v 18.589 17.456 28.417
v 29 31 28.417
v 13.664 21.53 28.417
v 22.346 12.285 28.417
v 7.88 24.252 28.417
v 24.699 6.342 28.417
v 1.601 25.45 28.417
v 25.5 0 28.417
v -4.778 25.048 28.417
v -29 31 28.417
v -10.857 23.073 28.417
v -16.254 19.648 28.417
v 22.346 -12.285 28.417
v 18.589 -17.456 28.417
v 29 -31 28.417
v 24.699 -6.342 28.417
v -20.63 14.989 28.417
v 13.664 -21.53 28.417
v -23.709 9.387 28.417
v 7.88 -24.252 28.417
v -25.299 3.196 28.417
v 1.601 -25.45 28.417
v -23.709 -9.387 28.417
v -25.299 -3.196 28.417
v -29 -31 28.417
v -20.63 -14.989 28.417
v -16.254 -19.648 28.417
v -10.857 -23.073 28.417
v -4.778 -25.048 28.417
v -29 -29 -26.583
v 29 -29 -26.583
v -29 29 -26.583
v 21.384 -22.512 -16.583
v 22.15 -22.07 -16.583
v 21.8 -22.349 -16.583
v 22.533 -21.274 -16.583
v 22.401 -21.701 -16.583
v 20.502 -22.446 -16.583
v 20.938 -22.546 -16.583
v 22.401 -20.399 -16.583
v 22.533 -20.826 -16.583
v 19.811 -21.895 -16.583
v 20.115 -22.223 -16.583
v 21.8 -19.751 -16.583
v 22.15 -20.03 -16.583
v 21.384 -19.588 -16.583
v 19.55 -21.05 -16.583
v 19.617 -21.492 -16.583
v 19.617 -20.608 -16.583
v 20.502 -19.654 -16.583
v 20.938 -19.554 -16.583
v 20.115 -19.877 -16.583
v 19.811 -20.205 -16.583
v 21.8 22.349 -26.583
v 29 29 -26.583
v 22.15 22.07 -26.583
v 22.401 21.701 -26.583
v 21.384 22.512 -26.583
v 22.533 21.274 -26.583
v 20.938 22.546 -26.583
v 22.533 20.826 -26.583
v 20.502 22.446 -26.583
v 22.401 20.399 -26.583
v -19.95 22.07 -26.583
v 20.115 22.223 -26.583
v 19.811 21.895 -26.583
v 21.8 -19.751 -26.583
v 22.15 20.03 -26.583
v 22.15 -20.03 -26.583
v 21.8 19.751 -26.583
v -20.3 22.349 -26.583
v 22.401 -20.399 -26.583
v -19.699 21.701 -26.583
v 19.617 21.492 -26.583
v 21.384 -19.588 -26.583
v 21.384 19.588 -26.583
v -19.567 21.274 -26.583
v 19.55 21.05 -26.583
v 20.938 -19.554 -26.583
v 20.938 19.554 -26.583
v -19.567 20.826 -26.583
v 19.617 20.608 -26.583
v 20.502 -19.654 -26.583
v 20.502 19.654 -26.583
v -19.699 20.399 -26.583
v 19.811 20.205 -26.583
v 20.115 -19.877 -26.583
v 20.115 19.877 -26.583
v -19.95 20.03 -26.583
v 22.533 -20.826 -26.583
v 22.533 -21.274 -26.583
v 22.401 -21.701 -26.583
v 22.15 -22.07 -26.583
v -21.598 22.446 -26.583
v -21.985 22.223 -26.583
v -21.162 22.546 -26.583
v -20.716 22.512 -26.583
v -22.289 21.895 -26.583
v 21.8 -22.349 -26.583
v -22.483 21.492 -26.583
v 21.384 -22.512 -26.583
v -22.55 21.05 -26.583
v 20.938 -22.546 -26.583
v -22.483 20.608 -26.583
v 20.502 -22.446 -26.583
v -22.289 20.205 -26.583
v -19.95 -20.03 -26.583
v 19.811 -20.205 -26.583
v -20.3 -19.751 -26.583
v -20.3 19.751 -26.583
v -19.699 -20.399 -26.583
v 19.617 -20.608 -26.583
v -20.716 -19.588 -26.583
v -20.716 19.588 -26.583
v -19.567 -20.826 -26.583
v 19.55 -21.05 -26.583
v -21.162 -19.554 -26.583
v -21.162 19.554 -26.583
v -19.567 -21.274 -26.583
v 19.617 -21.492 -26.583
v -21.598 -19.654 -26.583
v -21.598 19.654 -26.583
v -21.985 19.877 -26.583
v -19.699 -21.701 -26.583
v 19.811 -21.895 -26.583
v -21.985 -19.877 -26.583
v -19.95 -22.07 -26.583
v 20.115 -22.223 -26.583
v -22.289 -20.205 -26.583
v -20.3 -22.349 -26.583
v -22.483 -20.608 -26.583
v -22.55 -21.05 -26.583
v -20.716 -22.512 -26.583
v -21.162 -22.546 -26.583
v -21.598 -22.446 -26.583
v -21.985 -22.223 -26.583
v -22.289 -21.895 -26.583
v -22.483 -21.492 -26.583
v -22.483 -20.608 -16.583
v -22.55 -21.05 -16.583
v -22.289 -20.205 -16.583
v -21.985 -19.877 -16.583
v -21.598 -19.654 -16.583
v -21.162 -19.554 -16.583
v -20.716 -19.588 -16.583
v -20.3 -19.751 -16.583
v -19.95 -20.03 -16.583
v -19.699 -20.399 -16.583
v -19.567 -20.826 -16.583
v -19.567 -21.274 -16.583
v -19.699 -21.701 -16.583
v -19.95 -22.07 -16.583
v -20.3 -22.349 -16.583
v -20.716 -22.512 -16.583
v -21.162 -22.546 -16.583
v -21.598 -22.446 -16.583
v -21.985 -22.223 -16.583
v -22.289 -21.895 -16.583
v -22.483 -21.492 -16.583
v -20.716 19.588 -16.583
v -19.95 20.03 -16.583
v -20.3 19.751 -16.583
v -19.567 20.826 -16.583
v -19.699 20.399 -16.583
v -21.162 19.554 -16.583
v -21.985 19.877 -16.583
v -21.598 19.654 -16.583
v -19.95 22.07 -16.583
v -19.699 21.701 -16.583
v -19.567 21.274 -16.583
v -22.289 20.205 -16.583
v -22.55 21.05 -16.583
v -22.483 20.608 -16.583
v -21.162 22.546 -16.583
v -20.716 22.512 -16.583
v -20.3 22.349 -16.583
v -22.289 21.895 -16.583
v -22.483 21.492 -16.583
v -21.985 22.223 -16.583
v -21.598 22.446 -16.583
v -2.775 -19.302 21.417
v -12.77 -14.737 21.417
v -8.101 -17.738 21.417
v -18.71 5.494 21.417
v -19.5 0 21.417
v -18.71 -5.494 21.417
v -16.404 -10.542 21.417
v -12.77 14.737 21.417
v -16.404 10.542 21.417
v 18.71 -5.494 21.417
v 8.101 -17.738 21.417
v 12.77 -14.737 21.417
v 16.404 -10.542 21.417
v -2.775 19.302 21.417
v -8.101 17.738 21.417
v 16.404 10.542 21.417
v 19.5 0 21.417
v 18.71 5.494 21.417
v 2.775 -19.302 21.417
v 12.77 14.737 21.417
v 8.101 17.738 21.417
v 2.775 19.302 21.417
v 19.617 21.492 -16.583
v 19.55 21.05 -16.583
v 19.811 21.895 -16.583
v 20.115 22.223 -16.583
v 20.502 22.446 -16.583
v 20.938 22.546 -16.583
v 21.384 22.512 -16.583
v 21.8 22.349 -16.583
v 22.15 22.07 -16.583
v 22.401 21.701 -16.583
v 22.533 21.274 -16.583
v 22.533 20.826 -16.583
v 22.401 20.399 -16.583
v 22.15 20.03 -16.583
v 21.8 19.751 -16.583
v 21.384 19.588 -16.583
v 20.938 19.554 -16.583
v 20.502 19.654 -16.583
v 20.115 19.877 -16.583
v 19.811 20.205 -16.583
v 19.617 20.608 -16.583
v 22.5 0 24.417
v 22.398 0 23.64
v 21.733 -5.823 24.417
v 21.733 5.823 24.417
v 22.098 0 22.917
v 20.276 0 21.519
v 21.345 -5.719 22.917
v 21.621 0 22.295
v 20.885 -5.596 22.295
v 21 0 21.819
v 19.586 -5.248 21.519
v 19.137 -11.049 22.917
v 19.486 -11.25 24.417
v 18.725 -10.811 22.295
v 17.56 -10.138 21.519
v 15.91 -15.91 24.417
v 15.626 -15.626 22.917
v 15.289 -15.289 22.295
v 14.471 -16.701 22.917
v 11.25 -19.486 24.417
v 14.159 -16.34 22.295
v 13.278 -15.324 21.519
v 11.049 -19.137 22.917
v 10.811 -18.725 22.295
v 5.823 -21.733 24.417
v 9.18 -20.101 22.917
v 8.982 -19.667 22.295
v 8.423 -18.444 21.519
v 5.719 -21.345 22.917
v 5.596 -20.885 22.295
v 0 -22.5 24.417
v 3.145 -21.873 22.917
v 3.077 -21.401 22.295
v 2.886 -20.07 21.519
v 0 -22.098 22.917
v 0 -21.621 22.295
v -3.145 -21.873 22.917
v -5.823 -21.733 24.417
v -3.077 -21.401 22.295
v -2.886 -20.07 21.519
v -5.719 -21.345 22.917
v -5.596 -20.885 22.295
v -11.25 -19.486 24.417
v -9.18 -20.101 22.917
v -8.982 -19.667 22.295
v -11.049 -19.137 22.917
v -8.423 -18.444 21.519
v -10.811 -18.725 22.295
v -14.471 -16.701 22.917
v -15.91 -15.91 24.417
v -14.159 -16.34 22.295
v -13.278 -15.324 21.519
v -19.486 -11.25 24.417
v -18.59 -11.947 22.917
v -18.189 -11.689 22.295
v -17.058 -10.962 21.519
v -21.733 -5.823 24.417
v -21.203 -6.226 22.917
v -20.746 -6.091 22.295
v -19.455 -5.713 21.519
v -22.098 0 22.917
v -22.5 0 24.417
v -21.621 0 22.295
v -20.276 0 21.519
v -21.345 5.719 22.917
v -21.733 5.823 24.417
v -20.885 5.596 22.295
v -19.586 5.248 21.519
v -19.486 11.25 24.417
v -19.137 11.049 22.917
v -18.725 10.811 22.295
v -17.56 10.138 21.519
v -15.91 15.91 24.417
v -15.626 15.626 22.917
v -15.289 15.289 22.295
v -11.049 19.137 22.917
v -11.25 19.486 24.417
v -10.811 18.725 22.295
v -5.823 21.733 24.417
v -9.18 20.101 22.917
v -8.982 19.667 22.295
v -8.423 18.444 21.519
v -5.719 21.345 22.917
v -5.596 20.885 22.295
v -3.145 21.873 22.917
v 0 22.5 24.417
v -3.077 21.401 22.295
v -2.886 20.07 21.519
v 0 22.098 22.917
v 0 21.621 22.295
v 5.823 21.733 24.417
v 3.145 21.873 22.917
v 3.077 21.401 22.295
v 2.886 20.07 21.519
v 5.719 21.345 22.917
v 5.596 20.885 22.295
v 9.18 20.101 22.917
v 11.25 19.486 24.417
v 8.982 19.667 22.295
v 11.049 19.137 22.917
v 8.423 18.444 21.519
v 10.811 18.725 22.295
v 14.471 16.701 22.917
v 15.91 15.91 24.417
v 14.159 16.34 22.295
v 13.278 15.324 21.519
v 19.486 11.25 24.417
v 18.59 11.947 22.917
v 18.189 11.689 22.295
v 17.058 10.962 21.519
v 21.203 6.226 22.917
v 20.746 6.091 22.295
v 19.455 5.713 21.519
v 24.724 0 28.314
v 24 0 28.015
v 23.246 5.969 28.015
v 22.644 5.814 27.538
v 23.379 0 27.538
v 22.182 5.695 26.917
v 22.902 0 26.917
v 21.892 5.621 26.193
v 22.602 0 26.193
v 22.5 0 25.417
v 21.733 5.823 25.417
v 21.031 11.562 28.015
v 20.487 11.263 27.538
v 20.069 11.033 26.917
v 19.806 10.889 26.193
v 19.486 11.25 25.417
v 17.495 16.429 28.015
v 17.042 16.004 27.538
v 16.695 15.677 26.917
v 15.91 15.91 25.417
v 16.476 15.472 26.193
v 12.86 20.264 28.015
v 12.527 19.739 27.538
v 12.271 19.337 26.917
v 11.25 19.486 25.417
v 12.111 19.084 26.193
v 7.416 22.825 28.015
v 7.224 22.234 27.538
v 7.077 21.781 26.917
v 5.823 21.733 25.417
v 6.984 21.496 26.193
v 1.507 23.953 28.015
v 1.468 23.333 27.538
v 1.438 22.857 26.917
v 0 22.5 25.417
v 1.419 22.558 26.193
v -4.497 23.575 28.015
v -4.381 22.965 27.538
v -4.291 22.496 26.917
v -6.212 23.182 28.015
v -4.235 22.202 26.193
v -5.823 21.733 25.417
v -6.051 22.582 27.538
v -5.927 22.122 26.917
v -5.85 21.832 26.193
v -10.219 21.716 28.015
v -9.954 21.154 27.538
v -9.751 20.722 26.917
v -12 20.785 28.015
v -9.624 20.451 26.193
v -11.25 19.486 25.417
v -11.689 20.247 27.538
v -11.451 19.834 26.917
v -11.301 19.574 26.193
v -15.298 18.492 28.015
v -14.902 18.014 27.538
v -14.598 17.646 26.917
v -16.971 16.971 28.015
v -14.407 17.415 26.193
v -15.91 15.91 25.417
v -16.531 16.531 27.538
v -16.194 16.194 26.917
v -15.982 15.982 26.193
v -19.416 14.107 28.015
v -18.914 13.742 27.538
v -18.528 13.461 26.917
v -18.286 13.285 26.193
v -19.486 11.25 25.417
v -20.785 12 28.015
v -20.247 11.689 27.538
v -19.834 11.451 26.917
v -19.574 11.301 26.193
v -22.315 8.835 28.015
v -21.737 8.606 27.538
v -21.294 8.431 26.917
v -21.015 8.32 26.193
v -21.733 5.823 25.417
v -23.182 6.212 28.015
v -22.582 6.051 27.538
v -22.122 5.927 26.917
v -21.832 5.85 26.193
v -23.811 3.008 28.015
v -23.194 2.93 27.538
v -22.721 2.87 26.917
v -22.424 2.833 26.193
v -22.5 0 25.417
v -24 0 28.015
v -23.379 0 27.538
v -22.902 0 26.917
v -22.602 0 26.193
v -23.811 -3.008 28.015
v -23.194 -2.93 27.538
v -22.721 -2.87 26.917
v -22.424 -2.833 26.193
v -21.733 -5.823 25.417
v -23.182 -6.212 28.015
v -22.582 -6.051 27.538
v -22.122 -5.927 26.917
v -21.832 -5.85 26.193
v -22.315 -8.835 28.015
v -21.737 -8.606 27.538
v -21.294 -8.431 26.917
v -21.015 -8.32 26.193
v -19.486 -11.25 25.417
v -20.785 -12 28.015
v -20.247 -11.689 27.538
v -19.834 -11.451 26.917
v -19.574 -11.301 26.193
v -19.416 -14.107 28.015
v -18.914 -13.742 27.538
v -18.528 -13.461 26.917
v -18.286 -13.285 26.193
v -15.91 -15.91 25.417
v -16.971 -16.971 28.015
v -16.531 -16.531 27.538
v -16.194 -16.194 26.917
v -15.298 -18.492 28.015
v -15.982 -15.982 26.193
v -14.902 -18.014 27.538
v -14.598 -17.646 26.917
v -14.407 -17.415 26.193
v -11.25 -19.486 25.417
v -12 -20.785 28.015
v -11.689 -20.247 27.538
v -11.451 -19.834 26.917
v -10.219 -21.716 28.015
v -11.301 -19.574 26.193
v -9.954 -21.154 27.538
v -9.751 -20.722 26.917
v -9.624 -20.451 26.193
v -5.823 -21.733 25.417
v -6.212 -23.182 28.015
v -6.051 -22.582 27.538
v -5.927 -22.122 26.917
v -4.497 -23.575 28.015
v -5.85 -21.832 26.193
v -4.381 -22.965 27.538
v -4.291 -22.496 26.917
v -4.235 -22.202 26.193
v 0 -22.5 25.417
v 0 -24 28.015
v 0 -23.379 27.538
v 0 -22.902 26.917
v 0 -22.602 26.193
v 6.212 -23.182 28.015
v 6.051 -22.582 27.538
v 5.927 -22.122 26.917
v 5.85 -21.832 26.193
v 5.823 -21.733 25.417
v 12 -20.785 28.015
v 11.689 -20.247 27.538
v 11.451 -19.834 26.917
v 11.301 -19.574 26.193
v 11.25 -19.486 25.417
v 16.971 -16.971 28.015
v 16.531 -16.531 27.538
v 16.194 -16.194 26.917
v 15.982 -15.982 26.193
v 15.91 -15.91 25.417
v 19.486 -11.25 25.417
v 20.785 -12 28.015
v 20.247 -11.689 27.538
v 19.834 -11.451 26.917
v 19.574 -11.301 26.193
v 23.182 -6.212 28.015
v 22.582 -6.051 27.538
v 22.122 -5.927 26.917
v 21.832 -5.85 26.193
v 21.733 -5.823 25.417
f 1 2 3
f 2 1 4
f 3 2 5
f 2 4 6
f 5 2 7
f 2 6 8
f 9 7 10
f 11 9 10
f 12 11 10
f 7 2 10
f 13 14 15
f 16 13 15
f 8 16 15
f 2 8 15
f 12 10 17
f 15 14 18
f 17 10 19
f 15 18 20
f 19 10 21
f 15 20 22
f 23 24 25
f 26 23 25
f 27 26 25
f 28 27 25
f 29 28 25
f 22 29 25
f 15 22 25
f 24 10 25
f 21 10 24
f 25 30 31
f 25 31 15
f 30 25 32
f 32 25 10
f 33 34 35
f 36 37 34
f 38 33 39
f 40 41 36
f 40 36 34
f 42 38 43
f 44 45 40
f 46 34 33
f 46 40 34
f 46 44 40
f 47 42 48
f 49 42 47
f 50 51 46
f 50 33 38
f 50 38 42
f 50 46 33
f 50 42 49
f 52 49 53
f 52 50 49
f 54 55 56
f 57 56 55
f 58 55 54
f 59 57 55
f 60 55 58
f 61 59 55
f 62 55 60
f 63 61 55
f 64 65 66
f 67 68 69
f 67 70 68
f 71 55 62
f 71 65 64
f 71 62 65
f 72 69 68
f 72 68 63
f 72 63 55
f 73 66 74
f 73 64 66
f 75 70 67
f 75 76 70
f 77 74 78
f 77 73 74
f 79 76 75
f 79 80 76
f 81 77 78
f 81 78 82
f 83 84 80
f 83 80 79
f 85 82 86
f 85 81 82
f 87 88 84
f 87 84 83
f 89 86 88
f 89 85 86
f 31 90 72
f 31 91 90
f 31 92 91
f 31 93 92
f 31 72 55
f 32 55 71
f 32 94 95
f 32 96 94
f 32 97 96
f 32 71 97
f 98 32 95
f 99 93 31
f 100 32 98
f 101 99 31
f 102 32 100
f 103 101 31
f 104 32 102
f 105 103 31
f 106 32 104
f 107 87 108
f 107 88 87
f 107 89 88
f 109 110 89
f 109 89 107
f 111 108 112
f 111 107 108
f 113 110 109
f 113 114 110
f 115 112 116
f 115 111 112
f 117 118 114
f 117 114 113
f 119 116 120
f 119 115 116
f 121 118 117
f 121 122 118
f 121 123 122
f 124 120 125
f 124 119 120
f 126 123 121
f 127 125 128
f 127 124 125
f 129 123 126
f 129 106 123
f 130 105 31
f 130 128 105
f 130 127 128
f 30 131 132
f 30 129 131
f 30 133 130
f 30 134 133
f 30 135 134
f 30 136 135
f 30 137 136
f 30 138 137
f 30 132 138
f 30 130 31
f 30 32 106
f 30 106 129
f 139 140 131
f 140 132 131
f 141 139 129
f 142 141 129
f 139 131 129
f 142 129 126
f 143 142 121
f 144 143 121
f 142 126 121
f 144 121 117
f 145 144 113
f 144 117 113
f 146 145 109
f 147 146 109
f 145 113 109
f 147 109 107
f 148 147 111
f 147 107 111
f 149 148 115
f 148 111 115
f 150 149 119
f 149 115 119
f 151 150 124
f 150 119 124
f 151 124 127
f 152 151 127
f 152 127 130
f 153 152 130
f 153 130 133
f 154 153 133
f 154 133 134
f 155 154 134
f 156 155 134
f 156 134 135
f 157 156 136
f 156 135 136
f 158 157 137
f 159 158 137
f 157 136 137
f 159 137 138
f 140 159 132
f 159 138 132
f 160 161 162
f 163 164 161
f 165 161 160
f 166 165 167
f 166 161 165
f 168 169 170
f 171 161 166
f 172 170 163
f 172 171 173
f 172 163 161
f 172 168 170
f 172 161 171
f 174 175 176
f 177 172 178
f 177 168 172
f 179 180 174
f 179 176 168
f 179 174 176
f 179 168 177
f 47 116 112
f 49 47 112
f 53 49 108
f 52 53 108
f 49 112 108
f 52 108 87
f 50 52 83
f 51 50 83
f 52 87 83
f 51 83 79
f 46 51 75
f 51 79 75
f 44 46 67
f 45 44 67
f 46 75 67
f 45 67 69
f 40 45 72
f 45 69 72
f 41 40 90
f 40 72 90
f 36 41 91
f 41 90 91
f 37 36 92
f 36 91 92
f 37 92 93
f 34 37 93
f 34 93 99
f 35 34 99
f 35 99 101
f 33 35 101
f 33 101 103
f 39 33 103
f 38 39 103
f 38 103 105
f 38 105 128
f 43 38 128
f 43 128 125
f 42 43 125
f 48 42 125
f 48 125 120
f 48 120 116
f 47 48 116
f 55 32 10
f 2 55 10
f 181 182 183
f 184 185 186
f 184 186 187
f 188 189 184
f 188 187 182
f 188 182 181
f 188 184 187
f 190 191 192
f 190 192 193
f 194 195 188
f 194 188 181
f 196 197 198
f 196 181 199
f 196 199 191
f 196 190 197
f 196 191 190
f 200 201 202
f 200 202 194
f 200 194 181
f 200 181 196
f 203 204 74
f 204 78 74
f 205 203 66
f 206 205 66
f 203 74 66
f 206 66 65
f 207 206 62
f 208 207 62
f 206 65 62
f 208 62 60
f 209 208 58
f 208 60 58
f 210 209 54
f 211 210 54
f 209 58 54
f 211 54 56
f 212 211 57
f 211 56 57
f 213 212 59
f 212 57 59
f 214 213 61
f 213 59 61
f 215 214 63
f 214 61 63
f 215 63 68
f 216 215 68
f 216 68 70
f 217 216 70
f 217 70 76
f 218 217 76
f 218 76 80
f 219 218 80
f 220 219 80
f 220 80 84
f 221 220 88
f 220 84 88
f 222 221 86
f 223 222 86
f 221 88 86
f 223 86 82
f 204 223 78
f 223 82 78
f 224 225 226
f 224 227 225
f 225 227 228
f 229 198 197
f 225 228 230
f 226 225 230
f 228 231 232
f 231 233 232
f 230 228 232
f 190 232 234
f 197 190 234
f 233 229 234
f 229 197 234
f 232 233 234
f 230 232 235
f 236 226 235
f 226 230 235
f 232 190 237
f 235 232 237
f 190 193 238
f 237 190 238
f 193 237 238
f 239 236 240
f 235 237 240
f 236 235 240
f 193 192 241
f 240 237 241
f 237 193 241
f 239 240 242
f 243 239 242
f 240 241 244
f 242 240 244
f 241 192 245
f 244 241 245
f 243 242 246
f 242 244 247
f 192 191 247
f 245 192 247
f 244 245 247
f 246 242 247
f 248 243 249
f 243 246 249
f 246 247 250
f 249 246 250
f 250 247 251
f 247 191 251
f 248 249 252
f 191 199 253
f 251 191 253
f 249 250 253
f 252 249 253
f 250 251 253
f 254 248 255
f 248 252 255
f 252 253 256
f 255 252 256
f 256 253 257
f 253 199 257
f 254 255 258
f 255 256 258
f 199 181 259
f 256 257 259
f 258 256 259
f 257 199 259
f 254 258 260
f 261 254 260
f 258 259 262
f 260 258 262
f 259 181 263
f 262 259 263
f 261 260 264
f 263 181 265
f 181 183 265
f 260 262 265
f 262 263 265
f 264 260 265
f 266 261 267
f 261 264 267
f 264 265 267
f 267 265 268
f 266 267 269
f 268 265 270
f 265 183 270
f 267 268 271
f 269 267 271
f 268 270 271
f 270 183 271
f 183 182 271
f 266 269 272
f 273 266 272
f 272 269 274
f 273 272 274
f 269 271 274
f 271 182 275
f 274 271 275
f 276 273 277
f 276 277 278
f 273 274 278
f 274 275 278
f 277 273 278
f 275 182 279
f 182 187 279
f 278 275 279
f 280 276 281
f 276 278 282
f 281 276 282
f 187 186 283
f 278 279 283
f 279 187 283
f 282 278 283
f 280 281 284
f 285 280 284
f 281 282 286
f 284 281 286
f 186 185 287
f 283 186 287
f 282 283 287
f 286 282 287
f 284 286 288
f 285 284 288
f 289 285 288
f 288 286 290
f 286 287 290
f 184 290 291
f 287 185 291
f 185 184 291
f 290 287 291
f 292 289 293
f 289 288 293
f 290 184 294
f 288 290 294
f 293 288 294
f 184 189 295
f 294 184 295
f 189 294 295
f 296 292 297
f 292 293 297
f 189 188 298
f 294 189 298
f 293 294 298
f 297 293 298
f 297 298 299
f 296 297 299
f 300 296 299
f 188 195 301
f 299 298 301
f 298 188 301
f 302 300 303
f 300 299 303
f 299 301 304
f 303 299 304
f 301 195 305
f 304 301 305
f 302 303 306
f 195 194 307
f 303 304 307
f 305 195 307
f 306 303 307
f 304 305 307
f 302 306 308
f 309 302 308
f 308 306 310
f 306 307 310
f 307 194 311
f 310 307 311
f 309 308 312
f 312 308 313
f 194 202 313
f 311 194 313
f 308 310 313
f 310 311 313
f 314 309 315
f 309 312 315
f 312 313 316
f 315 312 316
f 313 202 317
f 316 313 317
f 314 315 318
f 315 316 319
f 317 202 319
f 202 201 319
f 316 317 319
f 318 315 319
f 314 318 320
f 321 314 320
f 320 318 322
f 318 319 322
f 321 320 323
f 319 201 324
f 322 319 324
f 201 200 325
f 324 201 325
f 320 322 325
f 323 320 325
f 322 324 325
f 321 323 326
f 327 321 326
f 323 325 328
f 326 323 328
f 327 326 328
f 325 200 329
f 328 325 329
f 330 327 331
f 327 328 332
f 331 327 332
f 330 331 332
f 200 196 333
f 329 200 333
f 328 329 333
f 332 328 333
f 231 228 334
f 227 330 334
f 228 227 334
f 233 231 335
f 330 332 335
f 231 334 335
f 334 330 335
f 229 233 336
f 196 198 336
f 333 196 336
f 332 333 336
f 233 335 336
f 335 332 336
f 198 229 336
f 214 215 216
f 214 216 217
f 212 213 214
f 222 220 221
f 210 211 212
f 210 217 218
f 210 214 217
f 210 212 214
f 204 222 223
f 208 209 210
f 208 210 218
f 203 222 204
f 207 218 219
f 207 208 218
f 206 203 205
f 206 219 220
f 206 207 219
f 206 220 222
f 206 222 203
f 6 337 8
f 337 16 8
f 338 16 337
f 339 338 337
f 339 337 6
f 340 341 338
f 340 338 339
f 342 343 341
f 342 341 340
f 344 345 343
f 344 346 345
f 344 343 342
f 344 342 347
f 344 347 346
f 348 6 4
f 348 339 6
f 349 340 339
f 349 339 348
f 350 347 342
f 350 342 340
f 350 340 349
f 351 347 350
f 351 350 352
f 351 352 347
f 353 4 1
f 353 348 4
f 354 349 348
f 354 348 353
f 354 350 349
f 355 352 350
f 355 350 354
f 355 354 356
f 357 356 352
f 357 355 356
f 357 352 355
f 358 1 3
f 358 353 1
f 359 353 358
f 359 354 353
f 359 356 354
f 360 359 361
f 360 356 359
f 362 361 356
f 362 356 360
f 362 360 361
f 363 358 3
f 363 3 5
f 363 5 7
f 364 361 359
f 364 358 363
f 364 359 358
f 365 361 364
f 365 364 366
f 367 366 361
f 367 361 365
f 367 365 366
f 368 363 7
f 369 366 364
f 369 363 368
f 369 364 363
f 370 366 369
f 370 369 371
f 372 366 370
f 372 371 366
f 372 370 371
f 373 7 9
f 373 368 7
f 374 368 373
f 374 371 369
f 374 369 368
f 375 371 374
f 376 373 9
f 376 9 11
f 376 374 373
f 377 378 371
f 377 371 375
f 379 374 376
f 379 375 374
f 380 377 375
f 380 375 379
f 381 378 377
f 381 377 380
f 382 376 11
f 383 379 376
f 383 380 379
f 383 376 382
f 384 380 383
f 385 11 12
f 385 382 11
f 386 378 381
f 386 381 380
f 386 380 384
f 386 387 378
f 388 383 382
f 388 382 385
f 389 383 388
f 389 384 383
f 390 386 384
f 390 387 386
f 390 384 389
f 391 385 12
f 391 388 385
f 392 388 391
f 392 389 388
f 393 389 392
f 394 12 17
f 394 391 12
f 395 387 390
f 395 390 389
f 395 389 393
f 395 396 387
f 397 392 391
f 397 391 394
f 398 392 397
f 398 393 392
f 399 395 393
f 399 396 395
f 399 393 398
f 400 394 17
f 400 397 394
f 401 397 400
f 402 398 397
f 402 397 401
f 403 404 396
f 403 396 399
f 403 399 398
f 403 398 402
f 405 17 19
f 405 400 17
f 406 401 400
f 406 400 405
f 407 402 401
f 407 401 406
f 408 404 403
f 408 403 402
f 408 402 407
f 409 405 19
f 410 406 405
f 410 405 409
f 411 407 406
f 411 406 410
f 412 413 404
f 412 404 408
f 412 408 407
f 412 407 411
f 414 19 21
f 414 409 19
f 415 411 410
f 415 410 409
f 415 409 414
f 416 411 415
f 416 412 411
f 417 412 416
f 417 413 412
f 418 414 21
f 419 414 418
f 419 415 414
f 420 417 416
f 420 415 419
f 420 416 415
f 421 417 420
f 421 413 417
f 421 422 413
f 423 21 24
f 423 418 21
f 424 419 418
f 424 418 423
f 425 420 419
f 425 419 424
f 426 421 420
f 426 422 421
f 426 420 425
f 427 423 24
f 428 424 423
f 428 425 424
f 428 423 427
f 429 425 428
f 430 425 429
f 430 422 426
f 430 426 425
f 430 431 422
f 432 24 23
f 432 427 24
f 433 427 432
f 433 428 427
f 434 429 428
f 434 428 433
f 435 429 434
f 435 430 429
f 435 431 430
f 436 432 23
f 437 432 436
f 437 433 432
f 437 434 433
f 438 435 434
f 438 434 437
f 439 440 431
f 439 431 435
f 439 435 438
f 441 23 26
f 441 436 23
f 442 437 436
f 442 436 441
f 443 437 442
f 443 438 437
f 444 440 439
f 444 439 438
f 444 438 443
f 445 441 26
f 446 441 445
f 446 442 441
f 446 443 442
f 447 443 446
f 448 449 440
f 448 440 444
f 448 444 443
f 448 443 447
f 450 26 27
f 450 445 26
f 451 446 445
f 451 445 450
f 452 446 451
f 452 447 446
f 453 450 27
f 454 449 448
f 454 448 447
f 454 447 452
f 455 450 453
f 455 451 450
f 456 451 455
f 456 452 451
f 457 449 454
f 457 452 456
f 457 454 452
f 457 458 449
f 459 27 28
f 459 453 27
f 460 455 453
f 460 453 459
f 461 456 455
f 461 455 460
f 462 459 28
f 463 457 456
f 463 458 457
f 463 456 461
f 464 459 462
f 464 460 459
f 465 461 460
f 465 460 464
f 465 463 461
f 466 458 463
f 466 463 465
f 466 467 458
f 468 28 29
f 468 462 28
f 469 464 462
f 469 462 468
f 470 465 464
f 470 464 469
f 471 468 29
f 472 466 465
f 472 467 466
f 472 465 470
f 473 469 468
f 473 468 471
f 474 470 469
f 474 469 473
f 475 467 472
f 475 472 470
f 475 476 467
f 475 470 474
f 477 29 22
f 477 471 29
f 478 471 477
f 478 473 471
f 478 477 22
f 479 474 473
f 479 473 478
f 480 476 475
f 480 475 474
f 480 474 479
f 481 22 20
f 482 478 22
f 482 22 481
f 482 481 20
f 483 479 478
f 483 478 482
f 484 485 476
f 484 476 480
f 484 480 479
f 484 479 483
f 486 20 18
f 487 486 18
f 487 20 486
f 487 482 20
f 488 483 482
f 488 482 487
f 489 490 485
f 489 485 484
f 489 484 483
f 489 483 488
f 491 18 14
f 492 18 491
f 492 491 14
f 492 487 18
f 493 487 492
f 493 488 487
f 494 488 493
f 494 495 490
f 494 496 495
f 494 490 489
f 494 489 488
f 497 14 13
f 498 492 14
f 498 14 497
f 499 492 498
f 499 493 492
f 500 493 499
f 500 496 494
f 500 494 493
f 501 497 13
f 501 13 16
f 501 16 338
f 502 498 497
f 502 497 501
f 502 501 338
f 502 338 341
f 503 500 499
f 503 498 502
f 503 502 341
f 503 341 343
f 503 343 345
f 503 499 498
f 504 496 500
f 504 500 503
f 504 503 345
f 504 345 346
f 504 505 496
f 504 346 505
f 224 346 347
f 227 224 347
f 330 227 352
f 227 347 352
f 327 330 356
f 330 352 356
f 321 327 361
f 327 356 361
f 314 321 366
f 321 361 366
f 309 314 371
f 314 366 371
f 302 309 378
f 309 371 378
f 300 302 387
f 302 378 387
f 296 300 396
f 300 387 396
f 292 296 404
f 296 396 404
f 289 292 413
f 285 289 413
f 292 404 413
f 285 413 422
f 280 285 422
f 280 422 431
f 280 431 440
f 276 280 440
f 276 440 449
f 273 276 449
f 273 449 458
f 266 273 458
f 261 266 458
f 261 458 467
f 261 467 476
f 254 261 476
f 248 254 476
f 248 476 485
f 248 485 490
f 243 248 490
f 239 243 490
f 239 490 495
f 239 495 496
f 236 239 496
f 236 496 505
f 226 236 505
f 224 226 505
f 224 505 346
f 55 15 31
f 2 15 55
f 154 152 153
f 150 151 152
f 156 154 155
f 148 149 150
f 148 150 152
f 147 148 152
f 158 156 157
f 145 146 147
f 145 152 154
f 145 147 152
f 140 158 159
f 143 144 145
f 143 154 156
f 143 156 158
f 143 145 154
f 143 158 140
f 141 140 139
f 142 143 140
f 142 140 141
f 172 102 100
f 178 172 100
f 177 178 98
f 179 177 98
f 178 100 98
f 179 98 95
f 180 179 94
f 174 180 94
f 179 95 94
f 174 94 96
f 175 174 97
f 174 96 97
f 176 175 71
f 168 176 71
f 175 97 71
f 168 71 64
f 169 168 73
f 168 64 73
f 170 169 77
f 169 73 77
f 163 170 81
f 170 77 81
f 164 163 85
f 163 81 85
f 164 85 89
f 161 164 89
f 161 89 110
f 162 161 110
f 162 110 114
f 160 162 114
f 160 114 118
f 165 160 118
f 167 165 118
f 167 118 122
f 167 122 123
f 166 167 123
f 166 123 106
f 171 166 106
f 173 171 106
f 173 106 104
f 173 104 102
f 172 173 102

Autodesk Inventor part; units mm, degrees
ref_plane "YZ Plane" through (0, 0, 0) normal (1, 0, 0) x (0, 1, 0)
ref_plane "XZ Plane" through (0, 0, 0) normal (0, 1, 0) x (-1, 0, 0)
ref_plane "XY Plane" through (0, 0, 0) normal (0, 0, 1) x (1, 0, 0)
sketch "Эскиз1" plane through (0, 0, 0) normal (1, 0, 0) x (0, 1, 0)
  line L0 (31, 28.4167) -> (-31, 28.4167)
  line L1 (29, -26.5833) -> (-29, -26.5833)
  line L2 (-29, -26.5833) -> (-31, 28.4167)
  line L3 (29, -26.5833) -> (31, 28.4167)
  line L4 (29, -26.5833) -> (-31, 28.4167) construction
  line L5 (31, 28.4167) -> (-29, -26.5833) construction
  line L6 (0, 39.4167) -> (0, -37.5833) construction
  point P0 (0, 0)
  point P1 (0, 0)
  point P2 (0, 0)
  point P3 (0, 28.4167)
  dimension "d0" = 58
  dimension "d1" = 62
  dimension "d2" = 55
extrude "Выдавливание1" add sketch "Эскиз1" along normal mid plane 58
sketch "Эскиз2" plane through (-29, -31, 28.4167) normal (0, 0, 1) x (1, 0, 0)
  circle A0 centre (29, 31) radius 22.5
  dimension "d5" = 45
extrude "Выдавливание2" cut sketch "Эскиз2" against normal blind 7
fillet "Сопряжение1" radius 3 2 edges at (-22.5, 0, 21.4167) (-22.5, 0, 28.4167)
sketch "Эскиз4" plane through (29, 29, -26.5833) normal (0, 0, -1) x (-1, 0, 0)
  circle A0 centre (7.95, -7.95) radius 1.5
  circle A1 centre (7.95, -50.05) radius 1.5
  circle A2 centre (50.05, -50.05) radius 1.5
  circle A3 centre (50.05, -7.95) radius 1.5
  line L0 (0, -58) -> (0, 0) projected
  line L1 (58, 0) -> (0, 0) projected
  line L2 (29, -21.9997) -> (29, -36.0003) construction
  line L3 (24.7856, -29) -> (33.2144, -29) construction
  line L4 (33.2144, -29) -> (24.7856, -29) construction
  line L5 (7.95, -7.95) -> (50.05, -7.95) construction
  line L6 (50.05, -7.95) -> (50.05, -50.05) construction
  line L7 (50.05, -50.05) -> (7.95, -50.05) construction
  line L8 (7.95, -7.95) -> (7.95, -50.05) construction
  line L9 (7.95, -7.95) -> (50.05, -50.05) construction
  line L10 (7.95, -50.05) -> (50.05, -7.95) construction
  point P0 (29, -29)
  point P1 (29, -29)
  point P2 (29, -29)
  dimension "d15" = 3
  dimension "d24" = 42.1
extrude "Выдавливание5" cut sketch "Эскиз4" against normal blind 10
properties part number "Колонка"
